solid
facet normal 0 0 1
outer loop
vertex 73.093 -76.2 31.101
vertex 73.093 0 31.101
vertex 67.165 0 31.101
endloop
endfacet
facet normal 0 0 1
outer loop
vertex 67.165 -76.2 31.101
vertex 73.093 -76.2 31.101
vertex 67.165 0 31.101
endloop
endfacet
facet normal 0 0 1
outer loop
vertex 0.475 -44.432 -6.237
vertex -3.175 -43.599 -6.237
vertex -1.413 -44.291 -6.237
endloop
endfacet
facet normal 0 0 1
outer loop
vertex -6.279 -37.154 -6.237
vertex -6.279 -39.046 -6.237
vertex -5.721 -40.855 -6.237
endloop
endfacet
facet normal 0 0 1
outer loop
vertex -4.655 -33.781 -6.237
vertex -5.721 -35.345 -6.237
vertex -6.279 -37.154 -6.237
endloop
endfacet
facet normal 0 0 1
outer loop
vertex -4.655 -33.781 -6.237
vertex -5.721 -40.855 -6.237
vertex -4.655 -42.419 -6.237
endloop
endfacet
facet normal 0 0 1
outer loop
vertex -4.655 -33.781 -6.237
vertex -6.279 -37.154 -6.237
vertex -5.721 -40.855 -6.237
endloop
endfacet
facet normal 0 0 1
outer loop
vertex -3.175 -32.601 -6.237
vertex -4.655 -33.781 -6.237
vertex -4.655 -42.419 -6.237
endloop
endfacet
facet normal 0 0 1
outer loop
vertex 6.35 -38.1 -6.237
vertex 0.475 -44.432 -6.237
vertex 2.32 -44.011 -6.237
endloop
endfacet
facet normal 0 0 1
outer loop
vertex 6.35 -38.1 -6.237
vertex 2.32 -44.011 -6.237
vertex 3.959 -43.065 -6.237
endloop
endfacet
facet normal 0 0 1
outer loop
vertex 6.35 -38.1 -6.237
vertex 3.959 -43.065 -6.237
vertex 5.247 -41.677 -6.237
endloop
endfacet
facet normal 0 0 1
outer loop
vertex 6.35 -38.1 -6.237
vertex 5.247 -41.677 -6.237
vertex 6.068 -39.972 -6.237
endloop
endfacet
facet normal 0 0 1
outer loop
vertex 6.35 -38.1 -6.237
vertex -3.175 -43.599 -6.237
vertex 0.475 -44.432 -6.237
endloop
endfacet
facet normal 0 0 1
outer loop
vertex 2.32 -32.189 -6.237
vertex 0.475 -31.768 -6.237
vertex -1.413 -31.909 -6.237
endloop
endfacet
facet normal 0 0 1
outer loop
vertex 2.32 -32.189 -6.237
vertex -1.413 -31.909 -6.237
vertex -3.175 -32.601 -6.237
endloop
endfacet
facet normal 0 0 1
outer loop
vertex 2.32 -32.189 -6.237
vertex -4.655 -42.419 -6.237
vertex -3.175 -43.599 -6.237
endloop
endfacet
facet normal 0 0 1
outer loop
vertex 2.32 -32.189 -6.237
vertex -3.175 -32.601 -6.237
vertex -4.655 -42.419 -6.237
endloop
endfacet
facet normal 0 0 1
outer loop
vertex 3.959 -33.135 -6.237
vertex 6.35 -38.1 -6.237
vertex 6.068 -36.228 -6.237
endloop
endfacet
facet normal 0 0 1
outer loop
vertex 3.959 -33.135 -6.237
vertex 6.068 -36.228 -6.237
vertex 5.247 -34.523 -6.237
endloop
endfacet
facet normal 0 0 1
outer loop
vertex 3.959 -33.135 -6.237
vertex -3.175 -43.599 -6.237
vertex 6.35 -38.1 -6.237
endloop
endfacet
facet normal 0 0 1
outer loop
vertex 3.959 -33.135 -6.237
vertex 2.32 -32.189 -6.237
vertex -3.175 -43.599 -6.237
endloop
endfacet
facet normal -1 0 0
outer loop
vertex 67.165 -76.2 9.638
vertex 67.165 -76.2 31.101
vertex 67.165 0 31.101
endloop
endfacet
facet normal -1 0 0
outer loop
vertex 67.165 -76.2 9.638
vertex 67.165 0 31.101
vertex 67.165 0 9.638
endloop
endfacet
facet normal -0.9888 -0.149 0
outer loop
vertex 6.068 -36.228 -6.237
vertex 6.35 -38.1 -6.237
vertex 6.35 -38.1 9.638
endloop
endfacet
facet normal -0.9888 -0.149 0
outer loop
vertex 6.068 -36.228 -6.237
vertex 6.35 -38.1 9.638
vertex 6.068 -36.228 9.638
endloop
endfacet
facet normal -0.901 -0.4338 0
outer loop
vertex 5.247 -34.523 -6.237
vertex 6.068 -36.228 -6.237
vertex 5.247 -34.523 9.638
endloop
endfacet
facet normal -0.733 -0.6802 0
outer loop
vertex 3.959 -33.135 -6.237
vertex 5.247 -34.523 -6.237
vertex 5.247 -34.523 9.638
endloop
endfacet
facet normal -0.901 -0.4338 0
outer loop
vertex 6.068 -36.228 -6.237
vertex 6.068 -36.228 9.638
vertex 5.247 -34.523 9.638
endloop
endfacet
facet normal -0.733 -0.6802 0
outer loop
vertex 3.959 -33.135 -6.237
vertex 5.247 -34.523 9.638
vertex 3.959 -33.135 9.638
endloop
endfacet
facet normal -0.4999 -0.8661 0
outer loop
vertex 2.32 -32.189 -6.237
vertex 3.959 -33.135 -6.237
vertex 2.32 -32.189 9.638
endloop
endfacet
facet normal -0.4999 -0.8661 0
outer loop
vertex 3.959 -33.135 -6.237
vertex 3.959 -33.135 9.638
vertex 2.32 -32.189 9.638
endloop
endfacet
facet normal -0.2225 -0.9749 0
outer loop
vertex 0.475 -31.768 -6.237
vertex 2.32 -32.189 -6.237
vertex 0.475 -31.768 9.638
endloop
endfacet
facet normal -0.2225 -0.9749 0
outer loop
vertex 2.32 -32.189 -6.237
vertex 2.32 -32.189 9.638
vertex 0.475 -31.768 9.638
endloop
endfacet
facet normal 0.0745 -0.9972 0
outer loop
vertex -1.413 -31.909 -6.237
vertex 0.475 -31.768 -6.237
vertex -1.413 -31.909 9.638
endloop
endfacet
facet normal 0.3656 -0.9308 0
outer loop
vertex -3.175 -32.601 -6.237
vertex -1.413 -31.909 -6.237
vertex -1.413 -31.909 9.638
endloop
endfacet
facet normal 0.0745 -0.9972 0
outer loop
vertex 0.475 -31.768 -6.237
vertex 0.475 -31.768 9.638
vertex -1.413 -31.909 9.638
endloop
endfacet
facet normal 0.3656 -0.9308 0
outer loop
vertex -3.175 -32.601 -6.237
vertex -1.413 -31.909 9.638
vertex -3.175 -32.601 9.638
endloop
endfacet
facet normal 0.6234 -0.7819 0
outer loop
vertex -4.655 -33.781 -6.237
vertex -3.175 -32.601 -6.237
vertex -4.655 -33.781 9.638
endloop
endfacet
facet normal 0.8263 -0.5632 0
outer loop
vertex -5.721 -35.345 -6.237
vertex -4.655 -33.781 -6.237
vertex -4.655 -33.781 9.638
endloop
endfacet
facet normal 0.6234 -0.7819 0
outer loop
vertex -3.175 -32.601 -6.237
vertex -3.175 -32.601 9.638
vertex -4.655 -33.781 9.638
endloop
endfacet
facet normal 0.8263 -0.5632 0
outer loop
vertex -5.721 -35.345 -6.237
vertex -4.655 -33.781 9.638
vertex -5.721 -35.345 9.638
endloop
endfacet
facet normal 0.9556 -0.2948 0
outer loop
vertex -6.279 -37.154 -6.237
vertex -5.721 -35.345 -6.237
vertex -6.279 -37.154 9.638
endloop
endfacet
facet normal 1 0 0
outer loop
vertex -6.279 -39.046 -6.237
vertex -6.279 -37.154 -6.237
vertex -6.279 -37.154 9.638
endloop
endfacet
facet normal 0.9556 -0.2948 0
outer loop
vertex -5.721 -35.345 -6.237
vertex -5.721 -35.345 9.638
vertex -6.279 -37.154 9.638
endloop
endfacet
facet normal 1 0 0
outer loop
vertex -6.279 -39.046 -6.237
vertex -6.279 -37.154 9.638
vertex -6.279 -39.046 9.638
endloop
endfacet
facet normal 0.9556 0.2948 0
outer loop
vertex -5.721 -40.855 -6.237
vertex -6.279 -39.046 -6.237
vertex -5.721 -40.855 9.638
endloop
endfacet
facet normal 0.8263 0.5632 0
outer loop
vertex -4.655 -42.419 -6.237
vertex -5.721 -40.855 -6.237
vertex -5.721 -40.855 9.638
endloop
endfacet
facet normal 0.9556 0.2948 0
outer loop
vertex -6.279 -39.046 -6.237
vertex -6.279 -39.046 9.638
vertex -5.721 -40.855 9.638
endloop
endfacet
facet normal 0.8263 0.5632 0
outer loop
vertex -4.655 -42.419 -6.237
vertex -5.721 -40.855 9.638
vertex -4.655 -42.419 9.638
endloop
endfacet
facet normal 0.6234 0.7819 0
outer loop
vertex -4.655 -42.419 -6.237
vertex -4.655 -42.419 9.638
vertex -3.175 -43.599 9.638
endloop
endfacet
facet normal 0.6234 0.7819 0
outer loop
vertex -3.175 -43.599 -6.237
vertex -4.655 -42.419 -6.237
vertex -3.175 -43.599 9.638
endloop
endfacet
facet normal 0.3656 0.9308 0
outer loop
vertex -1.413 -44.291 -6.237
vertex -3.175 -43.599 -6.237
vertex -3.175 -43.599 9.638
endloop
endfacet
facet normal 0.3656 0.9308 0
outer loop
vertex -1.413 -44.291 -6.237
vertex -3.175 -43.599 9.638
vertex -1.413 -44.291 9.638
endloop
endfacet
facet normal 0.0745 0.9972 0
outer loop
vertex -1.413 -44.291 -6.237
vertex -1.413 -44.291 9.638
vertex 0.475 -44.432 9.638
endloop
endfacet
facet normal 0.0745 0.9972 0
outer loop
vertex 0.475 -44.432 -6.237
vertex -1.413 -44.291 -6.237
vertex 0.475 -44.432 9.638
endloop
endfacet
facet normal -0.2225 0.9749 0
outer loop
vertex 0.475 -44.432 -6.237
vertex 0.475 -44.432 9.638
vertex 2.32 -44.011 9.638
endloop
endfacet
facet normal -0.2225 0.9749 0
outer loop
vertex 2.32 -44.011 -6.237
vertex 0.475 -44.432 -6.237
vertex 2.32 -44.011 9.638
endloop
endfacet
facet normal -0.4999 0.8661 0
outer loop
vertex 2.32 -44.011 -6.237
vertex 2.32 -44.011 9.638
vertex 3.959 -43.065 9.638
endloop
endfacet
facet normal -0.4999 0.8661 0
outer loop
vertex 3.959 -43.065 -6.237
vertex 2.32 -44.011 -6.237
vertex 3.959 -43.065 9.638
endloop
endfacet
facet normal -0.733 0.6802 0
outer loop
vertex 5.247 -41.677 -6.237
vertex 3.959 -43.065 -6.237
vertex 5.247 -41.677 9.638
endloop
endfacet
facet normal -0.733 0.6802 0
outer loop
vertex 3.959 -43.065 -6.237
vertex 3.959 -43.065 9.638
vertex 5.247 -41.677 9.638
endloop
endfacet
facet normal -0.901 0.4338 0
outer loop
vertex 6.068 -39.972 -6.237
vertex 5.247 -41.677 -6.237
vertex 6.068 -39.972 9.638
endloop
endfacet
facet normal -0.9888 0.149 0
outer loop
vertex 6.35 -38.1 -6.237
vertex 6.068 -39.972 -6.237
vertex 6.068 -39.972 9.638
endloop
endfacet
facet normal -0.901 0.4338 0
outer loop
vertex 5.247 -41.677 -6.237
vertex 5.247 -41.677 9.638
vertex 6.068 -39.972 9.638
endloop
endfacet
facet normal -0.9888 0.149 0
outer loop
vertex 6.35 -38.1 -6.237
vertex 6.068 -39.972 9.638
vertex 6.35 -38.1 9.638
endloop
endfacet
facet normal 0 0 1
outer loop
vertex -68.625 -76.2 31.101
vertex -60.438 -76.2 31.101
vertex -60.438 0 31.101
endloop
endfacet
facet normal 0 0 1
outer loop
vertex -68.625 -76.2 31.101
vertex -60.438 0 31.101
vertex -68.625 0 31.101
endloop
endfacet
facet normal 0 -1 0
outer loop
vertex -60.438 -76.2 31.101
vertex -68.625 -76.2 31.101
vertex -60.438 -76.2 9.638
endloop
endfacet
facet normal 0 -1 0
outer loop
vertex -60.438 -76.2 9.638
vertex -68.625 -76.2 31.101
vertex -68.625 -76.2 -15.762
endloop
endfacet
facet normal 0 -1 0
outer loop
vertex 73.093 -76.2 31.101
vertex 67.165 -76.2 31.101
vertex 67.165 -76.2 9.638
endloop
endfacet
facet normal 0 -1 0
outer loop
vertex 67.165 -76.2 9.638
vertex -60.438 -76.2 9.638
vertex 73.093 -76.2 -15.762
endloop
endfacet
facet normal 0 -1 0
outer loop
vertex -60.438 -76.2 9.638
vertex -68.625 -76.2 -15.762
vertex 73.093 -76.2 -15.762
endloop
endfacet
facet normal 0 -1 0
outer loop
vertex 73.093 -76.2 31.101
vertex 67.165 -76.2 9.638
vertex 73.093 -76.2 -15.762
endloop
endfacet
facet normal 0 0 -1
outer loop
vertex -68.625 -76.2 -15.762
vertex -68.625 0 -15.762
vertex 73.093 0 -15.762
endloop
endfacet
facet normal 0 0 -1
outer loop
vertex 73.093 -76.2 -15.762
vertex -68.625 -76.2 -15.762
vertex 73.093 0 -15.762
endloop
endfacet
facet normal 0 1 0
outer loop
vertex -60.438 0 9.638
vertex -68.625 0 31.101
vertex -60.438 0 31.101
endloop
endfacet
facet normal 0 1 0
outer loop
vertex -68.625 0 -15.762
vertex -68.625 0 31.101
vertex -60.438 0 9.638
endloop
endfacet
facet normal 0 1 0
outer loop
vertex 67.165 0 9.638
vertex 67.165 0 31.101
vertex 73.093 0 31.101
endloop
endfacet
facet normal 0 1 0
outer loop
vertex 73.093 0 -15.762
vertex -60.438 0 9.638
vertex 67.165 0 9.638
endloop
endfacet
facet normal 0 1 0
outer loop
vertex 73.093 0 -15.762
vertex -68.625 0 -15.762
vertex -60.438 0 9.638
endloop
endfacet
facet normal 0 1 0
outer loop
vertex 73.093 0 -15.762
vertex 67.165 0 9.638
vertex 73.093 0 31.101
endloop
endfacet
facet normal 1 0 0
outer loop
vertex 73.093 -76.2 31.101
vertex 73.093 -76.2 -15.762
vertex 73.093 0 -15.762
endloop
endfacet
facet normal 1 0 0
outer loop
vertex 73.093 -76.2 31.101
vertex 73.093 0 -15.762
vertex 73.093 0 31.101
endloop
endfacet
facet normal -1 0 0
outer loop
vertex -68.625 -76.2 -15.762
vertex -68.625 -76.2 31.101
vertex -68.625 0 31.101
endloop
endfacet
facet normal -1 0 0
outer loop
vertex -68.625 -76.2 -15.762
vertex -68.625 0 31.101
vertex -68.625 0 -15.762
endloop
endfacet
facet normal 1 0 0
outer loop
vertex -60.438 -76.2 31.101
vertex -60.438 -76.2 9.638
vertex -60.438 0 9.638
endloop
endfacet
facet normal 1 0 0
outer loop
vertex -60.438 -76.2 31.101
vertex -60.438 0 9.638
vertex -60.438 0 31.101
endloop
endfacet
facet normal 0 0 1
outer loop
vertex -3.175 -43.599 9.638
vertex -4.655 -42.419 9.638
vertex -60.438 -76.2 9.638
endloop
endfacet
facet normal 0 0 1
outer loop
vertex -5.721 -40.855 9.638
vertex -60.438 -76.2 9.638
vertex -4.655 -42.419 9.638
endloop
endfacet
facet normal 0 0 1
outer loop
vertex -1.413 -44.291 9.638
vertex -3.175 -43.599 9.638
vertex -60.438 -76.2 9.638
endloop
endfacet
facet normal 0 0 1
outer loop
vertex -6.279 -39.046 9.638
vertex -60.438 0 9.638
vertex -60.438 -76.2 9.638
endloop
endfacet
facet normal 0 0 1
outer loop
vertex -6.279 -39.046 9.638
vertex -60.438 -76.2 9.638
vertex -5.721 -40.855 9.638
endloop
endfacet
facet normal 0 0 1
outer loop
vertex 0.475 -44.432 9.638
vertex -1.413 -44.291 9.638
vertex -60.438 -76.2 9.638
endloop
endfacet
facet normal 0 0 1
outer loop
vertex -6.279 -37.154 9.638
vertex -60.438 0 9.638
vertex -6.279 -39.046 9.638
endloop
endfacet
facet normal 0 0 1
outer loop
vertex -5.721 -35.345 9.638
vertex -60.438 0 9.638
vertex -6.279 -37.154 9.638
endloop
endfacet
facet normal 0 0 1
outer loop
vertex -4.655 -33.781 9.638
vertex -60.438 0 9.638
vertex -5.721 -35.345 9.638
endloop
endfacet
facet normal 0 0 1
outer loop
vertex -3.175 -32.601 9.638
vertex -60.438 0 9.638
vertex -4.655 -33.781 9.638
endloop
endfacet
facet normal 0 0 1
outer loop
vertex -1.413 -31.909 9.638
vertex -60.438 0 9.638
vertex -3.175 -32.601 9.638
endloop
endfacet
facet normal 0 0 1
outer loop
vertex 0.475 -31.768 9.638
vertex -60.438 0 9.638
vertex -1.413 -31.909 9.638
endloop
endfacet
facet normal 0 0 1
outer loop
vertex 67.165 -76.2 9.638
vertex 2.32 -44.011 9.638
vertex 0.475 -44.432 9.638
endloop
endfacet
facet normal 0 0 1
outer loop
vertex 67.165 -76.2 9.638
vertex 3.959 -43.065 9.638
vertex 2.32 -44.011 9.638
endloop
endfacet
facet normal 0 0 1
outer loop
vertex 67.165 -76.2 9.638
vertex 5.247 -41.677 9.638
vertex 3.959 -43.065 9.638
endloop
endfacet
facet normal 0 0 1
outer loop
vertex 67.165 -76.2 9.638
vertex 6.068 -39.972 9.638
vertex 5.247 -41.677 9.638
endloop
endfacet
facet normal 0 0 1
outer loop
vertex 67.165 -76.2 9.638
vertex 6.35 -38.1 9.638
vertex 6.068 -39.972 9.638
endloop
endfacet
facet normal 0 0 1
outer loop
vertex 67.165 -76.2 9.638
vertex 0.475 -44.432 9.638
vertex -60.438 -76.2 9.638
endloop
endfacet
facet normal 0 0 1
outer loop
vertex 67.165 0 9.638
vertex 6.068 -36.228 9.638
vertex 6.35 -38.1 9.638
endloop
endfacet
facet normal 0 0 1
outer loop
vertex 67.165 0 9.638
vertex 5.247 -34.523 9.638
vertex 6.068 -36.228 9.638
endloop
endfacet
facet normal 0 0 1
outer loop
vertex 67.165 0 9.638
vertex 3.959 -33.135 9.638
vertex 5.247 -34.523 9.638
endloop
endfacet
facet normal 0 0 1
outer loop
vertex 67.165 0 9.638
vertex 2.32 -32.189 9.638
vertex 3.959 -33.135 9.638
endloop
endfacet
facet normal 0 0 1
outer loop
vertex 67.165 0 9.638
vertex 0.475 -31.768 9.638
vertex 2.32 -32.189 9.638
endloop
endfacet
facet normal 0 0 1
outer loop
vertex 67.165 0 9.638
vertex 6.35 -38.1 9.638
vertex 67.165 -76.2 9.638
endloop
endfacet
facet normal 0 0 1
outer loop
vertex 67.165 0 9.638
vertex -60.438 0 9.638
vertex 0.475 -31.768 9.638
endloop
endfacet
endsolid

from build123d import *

# Parameters (mm, degrees)
F1_DEPTH  = 76.2
F1_FACE_W = 12.7
F1_FACE_H = 76.2
F2_DEPTH  = 15.875
F3_R      = 6.35
F4_DEPTH  = 15.875


with BuildPart() as f1:
    # F0 (on Front) → F1 (new body)
    with BuildSketch(Plane.XZ):
        Polygon((-60.43807, 31.100702), (-68.62498, 31.100702), (-68.62498, -15.762298), (73.093257, -15.762298), (73.093257, 31.100702), (67.1648, 31.100702), (67.1648, 9.637702), (6.35, 9.637702), (6.35, -6.237298), (-6.35, -6.237298), (-6.35, 9.637702), (-60.43807, 9.637702), align=None)
    extrude(amount=F1_DEPTH)

    # F1_face (on face) → F2 (join)
    with BuildSketch(Plane(origin=(0, -38.1, -6.237298), x_dir=(1, 0, 0), z_dir=(0, 0, 1))):
        Rectangle(F1_FACE_W, F1_FACE_H)
    extrude(amount=F2_DEPTH)

    # F3 (on face) → F4 (cut)
    with BuildSketch(Plane.XY.offset(9.637702)):
        with Locations((0, -38.1)):
            Circle(F3_R)
    extrude(amount=-F4_DEPTH, mode=Mode.SUBTRACT)


solid = f1.part
